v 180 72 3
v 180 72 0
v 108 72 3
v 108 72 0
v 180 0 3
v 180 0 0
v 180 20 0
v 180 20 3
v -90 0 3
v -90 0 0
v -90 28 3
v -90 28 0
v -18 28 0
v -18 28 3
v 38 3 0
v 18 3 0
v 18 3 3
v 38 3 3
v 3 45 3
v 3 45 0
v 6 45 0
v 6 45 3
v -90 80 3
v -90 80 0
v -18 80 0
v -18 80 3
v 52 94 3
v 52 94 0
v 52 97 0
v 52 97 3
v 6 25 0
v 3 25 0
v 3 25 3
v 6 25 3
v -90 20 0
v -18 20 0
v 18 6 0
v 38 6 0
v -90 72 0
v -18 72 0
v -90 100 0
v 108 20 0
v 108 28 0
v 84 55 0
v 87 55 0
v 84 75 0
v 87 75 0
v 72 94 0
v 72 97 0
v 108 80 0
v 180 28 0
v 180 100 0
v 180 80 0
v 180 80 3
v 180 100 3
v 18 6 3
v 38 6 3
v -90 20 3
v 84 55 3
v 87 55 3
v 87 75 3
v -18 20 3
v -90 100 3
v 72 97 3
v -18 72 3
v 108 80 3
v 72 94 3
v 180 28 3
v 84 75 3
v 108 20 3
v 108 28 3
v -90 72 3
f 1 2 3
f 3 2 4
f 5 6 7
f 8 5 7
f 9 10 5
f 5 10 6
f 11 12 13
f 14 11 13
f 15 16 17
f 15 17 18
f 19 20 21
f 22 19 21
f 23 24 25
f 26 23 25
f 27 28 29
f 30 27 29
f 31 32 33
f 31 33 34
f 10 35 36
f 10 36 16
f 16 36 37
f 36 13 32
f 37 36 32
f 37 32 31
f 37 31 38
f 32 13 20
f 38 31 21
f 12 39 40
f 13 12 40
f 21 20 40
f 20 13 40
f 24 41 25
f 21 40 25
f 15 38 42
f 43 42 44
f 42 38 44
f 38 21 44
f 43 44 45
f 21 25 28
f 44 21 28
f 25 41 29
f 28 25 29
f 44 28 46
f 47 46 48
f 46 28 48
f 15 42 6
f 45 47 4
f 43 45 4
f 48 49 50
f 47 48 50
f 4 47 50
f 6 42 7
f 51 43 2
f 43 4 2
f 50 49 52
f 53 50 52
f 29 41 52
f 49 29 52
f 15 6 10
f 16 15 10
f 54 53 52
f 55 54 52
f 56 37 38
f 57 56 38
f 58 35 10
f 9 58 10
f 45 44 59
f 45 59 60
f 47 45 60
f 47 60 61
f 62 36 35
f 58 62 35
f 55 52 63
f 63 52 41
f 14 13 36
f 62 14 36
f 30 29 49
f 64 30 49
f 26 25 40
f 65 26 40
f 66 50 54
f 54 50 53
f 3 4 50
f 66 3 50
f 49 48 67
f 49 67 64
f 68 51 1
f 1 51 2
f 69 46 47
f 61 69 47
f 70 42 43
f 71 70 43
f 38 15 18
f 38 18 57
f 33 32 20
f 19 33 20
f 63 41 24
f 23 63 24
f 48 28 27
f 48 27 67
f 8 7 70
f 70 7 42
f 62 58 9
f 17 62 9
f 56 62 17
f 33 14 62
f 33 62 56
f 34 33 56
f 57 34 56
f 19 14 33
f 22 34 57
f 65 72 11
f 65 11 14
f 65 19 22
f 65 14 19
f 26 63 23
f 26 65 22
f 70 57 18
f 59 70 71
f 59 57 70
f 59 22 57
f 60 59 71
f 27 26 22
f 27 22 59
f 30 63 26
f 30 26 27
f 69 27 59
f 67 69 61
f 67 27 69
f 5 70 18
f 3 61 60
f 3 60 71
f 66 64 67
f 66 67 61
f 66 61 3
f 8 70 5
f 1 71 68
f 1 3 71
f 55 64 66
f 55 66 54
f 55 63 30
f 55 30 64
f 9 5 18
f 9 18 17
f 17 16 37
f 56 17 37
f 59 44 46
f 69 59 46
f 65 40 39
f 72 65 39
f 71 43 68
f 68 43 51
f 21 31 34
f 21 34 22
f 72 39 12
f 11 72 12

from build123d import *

# Parameters (mm, degrees)
SKETCH_1_W      = 20
SKETCH_1_H      = 3
SKETCH_1_W_2    = 3
SKETCH_1_H_2    = 20
EXTRUDE_1_DEPTH = 3


with BuildPart() as part:
    # Эскиз1 → Бобышка-Вытянуть1 (new body)
    with BuildSketch(Plane.XY):
        Polygon((0, 0), (90, 0), (180, 0), (180, 20), (108, 20), (108, 28), (180, 28), (180, 72), (108, 72), (108, 80), (180, 80), (180, 100), (90, 100), (0, 100), (-90, 100), (-90, 80), (-18, 80), (-18, 72), (-90, 72), (-90, 28), (-18, 28), (-18, 20), (-90, 20), (-90, 0), align=None)
        with Locations((28, 4.5)):
            Rectangle(SKETCH_1_W, SKETCH_1_H, mode=Mode.SUBTRACT)
        with Locations((62, 95.5)):
            Rectangle(SKETCH_1_W, SKETCH_1_H, mode=Mode.SUBTRACT)
        with Locations((4.5, 35)):
            Rectangle(SKETCH_1_W_2, SKETCH_1_H_2, mode=Mode.SUBTRACT)
        with Locations((85.5, 65)):
            Rectangle(SKETCH_1_W_2, SKETCH_1_H_2, mode=Mode.SUBTRACT)
    extrude(amount=EXTRUDE_1_DEPTH)


solid = part.part
